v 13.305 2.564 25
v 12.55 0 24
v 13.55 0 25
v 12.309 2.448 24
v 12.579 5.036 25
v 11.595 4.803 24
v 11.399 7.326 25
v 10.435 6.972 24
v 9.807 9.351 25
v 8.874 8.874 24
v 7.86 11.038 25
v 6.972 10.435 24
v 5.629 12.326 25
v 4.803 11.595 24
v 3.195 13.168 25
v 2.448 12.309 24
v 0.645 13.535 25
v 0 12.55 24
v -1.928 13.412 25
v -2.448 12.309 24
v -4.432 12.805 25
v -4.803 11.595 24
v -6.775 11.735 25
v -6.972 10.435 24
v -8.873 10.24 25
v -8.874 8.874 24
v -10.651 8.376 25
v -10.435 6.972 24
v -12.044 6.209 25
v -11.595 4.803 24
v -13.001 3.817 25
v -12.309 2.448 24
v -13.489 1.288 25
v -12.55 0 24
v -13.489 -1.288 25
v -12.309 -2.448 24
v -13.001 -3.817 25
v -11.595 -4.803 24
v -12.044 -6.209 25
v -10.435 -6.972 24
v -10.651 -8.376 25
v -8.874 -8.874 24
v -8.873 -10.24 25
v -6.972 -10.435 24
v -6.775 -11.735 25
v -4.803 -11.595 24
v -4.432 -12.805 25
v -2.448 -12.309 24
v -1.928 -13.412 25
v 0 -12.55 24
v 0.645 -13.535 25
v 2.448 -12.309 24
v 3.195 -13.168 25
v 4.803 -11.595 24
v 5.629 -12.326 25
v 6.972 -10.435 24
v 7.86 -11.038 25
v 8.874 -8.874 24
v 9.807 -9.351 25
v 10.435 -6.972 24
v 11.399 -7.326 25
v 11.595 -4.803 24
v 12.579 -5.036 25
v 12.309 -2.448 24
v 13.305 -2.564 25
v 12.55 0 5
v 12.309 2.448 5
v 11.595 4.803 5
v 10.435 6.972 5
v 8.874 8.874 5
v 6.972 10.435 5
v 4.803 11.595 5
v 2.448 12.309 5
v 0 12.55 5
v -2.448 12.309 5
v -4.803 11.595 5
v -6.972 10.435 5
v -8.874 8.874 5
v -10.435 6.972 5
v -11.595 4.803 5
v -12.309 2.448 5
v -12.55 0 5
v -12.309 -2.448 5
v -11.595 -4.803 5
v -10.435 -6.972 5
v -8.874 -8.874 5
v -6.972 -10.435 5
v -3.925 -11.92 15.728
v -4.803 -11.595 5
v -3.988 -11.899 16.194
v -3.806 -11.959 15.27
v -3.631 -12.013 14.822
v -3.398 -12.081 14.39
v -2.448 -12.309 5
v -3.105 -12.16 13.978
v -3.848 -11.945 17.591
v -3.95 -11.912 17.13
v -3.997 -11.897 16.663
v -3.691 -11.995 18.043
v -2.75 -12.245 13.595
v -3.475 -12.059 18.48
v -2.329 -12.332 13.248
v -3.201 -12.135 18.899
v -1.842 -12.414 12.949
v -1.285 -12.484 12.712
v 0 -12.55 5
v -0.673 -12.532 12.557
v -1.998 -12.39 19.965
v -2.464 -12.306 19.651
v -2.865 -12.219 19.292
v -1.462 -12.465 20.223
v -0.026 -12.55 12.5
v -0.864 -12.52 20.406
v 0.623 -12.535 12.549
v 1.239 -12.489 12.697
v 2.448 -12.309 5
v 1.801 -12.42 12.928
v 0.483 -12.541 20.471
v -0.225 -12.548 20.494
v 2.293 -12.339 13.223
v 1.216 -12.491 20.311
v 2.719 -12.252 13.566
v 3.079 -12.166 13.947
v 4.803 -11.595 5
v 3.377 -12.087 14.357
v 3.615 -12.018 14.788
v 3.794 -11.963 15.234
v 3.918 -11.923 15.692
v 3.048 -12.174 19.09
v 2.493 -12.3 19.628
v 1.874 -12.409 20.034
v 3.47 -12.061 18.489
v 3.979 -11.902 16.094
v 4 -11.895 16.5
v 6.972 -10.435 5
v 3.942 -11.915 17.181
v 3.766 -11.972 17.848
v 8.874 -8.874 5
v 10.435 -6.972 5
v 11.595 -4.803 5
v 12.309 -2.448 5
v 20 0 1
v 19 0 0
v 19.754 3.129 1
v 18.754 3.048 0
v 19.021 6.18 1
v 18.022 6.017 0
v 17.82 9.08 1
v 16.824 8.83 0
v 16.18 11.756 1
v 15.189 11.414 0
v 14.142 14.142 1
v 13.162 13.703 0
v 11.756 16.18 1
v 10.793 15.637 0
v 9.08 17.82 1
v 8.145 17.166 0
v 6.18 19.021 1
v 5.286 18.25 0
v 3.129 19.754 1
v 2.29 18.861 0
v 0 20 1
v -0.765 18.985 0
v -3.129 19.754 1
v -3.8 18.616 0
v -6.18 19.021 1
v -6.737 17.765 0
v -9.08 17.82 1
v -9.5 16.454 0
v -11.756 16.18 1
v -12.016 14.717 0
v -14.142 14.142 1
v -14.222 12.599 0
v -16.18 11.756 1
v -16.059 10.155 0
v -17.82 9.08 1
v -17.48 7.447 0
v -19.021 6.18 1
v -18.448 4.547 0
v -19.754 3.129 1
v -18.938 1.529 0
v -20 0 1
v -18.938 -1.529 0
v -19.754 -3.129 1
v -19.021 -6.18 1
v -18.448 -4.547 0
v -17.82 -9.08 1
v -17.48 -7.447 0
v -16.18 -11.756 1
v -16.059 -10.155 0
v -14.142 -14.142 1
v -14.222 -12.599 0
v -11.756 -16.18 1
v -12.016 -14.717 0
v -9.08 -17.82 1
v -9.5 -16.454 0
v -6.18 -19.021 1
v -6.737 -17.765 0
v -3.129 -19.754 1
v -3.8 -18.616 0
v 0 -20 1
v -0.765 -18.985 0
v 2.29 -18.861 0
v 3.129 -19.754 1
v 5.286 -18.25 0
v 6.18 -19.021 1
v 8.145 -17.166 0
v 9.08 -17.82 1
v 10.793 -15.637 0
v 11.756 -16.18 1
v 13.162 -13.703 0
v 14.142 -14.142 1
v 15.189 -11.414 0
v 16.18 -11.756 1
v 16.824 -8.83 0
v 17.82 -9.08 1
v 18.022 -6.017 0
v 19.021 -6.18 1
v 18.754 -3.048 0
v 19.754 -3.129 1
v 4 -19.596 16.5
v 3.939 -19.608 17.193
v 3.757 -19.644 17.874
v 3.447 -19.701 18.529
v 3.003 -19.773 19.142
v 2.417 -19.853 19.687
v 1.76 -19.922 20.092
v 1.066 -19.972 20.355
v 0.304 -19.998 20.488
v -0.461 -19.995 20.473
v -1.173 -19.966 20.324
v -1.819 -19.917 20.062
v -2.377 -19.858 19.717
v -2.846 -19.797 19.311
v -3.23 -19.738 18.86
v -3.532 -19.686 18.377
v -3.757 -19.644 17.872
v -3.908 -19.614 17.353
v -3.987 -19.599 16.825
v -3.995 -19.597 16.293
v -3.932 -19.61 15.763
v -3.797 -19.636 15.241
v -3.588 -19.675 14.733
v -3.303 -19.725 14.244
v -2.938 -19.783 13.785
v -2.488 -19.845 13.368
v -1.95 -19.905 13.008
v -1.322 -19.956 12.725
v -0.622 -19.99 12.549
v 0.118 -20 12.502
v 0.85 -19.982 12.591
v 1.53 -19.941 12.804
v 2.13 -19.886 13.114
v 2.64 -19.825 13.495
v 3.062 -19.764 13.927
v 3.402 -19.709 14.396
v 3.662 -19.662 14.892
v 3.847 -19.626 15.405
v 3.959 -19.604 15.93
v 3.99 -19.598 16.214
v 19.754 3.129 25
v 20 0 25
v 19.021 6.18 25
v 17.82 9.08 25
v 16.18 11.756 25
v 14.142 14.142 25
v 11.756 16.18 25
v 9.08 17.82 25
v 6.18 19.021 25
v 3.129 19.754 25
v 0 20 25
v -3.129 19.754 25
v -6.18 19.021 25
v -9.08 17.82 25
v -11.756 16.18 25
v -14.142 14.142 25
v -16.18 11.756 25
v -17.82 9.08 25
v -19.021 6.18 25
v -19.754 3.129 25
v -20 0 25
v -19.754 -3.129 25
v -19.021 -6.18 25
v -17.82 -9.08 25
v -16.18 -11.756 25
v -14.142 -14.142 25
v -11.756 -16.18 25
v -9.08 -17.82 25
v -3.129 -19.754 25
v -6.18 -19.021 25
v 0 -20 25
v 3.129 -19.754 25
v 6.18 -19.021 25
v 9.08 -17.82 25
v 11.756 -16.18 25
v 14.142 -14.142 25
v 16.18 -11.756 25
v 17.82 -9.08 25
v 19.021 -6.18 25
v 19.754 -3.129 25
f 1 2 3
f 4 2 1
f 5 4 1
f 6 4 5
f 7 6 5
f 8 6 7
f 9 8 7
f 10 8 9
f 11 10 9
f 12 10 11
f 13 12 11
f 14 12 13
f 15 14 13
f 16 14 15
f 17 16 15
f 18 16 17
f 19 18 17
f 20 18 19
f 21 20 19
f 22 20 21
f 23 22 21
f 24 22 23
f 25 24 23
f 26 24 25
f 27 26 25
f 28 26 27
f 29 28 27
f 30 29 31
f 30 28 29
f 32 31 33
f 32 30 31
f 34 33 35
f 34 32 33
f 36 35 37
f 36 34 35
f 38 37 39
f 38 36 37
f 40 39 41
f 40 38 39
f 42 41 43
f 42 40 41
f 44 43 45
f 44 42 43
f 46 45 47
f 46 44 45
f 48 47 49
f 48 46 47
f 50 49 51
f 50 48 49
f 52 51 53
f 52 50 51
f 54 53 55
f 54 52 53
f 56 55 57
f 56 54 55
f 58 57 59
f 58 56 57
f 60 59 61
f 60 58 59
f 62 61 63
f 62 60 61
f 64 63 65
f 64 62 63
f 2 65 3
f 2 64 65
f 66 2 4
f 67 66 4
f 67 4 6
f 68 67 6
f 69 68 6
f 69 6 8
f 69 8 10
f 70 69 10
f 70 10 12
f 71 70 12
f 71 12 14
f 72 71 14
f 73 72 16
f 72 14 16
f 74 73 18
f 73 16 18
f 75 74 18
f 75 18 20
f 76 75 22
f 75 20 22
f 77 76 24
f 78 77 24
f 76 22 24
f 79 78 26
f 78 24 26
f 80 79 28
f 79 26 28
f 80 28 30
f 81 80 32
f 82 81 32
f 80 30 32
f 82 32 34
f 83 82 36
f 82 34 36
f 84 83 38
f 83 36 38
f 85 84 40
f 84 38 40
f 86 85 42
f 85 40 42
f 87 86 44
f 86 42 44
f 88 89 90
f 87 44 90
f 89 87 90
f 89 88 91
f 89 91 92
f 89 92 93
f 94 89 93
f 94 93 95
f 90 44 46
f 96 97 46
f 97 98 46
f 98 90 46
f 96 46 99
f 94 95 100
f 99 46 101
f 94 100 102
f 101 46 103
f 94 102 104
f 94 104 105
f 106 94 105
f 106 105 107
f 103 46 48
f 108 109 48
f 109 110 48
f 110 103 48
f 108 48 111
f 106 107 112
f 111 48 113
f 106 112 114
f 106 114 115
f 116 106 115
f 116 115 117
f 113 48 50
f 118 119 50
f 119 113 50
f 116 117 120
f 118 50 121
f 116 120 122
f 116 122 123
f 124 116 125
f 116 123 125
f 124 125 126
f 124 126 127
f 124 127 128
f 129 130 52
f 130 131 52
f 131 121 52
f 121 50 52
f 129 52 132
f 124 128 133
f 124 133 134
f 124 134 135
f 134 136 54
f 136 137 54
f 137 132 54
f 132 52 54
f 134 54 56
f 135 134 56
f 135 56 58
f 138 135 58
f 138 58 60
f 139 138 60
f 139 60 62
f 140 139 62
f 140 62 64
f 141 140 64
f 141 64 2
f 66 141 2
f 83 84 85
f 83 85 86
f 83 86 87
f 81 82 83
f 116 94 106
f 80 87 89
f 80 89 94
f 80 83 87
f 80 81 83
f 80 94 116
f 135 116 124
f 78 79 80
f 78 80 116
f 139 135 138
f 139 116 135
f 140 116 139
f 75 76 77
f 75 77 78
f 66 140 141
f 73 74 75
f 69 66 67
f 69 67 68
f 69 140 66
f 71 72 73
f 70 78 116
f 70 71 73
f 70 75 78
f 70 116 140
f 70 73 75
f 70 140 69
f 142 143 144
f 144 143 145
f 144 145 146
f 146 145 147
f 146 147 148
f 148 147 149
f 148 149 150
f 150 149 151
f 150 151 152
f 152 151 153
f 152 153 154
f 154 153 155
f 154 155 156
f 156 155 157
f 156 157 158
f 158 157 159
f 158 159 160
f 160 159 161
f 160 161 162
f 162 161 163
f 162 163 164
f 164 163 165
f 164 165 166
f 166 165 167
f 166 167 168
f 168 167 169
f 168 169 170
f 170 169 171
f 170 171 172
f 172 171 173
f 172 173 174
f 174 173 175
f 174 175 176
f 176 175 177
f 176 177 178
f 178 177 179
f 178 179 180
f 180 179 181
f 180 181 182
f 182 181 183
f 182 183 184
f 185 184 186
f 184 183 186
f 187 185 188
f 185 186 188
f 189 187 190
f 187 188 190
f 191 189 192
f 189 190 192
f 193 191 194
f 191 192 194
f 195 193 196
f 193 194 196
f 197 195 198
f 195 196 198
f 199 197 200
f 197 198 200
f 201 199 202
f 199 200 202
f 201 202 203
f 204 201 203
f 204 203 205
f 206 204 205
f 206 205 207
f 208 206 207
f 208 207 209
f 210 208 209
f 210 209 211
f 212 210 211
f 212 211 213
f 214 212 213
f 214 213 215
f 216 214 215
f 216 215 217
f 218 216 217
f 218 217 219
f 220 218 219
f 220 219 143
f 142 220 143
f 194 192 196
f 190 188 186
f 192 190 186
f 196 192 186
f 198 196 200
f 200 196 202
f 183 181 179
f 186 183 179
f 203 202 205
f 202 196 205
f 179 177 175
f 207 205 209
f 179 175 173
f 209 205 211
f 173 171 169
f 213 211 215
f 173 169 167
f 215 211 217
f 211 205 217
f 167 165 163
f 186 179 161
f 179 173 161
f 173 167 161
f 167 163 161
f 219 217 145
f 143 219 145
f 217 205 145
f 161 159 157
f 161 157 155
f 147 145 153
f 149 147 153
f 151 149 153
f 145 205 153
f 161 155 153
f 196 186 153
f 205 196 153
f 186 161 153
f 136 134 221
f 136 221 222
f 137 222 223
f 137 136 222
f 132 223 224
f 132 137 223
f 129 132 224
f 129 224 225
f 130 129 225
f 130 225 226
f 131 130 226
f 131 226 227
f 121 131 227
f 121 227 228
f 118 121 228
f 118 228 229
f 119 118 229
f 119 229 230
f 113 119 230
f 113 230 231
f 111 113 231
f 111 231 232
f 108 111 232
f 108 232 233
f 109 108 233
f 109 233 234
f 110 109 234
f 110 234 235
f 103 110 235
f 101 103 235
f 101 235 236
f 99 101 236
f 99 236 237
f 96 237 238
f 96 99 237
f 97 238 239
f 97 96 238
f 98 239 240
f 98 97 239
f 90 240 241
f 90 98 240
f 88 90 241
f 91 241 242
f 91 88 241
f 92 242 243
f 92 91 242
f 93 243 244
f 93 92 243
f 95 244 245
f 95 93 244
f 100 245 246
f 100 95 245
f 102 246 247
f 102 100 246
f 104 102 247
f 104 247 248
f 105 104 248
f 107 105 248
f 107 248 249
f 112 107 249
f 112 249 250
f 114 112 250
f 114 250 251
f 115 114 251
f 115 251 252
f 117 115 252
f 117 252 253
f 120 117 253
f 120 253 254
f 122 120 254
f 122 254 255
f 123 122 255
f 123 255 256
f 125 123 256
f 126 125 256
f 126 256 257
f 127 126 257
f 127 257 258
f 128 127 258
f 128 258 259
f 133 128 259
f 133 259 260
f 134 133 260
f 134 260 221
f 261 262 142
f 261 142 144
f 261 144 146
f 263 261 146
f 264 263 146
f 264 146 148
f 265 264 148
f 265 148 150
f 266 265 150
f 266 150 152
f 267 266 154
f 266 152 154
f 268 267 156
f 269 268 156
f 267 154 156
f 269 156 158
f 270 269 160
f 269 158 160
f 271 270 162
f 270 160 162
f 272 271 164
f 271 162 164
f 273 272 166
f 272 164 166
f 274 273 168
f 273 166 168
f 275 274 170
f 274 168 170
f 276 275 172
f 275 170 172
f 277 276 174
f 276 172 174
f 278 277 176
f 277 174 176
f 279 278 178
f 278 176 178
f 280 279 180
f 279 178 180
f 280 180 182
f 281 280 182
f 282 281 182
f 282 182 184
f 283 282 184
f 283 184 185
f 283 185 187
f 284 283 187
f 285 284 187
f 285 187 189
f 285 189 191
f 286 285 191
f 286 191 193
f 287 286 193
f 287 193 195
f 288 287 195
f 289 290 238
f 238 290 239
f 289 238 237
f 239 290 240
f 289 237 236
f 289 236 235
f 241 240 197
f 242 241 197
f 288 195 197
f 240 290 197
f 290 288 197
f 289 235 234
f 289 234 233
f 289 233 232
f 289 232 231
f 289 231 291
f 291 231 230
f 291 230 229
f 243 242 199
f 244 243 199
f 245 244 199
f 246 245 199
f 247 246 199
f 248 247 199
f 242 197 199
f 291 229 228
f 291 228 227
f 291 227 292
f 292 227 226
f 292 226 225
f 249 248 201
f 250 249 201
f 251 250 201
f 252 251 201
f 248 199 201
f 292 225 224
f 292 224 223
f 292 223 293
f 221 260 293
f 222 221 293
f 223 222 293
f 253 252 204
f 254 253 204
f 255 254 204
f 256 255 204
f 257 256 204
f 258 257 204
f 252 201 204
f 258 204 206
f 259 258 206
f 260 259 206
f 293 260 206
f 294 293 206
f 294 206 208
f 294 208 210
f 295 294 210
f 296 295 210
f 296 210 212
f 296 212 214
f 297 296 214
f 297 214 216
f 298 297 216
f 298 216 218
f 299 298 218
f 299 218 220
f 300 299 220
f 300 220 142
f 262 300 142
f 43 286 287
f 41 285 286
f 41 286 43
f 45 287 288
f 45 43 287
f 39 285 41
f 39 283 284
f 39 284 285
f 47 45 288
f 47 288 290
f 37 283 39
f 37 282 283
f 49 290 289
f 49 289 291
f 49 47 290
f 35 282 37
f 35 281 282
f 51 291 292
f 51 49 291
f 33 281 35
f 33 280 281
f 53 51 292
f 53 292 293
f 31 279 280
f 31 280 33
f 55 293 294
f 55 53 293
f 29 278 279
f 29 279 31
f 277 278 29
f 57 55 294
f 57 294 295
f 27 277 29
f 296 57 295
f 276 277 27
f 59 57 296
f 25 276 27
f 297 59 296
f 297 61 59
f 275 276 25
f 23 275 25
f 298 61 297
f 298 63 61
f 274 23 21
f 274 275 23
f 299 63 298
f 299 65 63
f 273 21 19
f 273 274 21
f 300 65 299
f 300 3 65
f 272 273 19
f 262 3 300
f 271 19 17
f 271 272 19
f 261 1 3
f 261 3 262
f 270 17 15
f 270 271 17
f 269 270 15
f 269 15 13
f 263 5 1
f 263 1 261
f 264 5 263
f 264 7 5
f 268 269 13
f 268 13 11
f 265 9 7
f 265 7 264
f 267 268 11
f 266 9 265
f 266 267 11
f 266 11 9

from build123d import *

# Parameters (mm, degrees)
F0_R     = 20
F1_DEPTH = 25
F2_R     = 12.55
F3_DEPTH = 20
F4_R     = 4
F5_DEPTH = 25
F6_SIZE  = 1


with BuildPart() as f1:
    # F0 (on Top) → F1 (new body)
    with BuildSketch(Plane.XY):
        Circle(F0_R)
    extrude(amount=F1_DEPTH)

    # F2 (on face) → F3 (cut)
    with BuildSketch(Plane.XY.offset(25)):
        Circle(F2_R)
    extrude(amount=-F3_DEPTH, mode=Mode.SUBTRACT)

    # F4 (on Front) → F5 (cut)
    with BuildSketch(Plane.XZ):
        with Locations((0, 16.5)):
            Circle(F4_R)
    extrude(amount=F5_DEPTH, mode=Mode.SUBTRACT)

    # F6
    f6_edges = [f1.edges().sort_by_distance(p)[0] for p in [
        (-20, 0, 0),
        (-12.55, 0, 25),
    ]]
    chamfer(f6_edges, length=F6_SIZE)


solid = f1.part
